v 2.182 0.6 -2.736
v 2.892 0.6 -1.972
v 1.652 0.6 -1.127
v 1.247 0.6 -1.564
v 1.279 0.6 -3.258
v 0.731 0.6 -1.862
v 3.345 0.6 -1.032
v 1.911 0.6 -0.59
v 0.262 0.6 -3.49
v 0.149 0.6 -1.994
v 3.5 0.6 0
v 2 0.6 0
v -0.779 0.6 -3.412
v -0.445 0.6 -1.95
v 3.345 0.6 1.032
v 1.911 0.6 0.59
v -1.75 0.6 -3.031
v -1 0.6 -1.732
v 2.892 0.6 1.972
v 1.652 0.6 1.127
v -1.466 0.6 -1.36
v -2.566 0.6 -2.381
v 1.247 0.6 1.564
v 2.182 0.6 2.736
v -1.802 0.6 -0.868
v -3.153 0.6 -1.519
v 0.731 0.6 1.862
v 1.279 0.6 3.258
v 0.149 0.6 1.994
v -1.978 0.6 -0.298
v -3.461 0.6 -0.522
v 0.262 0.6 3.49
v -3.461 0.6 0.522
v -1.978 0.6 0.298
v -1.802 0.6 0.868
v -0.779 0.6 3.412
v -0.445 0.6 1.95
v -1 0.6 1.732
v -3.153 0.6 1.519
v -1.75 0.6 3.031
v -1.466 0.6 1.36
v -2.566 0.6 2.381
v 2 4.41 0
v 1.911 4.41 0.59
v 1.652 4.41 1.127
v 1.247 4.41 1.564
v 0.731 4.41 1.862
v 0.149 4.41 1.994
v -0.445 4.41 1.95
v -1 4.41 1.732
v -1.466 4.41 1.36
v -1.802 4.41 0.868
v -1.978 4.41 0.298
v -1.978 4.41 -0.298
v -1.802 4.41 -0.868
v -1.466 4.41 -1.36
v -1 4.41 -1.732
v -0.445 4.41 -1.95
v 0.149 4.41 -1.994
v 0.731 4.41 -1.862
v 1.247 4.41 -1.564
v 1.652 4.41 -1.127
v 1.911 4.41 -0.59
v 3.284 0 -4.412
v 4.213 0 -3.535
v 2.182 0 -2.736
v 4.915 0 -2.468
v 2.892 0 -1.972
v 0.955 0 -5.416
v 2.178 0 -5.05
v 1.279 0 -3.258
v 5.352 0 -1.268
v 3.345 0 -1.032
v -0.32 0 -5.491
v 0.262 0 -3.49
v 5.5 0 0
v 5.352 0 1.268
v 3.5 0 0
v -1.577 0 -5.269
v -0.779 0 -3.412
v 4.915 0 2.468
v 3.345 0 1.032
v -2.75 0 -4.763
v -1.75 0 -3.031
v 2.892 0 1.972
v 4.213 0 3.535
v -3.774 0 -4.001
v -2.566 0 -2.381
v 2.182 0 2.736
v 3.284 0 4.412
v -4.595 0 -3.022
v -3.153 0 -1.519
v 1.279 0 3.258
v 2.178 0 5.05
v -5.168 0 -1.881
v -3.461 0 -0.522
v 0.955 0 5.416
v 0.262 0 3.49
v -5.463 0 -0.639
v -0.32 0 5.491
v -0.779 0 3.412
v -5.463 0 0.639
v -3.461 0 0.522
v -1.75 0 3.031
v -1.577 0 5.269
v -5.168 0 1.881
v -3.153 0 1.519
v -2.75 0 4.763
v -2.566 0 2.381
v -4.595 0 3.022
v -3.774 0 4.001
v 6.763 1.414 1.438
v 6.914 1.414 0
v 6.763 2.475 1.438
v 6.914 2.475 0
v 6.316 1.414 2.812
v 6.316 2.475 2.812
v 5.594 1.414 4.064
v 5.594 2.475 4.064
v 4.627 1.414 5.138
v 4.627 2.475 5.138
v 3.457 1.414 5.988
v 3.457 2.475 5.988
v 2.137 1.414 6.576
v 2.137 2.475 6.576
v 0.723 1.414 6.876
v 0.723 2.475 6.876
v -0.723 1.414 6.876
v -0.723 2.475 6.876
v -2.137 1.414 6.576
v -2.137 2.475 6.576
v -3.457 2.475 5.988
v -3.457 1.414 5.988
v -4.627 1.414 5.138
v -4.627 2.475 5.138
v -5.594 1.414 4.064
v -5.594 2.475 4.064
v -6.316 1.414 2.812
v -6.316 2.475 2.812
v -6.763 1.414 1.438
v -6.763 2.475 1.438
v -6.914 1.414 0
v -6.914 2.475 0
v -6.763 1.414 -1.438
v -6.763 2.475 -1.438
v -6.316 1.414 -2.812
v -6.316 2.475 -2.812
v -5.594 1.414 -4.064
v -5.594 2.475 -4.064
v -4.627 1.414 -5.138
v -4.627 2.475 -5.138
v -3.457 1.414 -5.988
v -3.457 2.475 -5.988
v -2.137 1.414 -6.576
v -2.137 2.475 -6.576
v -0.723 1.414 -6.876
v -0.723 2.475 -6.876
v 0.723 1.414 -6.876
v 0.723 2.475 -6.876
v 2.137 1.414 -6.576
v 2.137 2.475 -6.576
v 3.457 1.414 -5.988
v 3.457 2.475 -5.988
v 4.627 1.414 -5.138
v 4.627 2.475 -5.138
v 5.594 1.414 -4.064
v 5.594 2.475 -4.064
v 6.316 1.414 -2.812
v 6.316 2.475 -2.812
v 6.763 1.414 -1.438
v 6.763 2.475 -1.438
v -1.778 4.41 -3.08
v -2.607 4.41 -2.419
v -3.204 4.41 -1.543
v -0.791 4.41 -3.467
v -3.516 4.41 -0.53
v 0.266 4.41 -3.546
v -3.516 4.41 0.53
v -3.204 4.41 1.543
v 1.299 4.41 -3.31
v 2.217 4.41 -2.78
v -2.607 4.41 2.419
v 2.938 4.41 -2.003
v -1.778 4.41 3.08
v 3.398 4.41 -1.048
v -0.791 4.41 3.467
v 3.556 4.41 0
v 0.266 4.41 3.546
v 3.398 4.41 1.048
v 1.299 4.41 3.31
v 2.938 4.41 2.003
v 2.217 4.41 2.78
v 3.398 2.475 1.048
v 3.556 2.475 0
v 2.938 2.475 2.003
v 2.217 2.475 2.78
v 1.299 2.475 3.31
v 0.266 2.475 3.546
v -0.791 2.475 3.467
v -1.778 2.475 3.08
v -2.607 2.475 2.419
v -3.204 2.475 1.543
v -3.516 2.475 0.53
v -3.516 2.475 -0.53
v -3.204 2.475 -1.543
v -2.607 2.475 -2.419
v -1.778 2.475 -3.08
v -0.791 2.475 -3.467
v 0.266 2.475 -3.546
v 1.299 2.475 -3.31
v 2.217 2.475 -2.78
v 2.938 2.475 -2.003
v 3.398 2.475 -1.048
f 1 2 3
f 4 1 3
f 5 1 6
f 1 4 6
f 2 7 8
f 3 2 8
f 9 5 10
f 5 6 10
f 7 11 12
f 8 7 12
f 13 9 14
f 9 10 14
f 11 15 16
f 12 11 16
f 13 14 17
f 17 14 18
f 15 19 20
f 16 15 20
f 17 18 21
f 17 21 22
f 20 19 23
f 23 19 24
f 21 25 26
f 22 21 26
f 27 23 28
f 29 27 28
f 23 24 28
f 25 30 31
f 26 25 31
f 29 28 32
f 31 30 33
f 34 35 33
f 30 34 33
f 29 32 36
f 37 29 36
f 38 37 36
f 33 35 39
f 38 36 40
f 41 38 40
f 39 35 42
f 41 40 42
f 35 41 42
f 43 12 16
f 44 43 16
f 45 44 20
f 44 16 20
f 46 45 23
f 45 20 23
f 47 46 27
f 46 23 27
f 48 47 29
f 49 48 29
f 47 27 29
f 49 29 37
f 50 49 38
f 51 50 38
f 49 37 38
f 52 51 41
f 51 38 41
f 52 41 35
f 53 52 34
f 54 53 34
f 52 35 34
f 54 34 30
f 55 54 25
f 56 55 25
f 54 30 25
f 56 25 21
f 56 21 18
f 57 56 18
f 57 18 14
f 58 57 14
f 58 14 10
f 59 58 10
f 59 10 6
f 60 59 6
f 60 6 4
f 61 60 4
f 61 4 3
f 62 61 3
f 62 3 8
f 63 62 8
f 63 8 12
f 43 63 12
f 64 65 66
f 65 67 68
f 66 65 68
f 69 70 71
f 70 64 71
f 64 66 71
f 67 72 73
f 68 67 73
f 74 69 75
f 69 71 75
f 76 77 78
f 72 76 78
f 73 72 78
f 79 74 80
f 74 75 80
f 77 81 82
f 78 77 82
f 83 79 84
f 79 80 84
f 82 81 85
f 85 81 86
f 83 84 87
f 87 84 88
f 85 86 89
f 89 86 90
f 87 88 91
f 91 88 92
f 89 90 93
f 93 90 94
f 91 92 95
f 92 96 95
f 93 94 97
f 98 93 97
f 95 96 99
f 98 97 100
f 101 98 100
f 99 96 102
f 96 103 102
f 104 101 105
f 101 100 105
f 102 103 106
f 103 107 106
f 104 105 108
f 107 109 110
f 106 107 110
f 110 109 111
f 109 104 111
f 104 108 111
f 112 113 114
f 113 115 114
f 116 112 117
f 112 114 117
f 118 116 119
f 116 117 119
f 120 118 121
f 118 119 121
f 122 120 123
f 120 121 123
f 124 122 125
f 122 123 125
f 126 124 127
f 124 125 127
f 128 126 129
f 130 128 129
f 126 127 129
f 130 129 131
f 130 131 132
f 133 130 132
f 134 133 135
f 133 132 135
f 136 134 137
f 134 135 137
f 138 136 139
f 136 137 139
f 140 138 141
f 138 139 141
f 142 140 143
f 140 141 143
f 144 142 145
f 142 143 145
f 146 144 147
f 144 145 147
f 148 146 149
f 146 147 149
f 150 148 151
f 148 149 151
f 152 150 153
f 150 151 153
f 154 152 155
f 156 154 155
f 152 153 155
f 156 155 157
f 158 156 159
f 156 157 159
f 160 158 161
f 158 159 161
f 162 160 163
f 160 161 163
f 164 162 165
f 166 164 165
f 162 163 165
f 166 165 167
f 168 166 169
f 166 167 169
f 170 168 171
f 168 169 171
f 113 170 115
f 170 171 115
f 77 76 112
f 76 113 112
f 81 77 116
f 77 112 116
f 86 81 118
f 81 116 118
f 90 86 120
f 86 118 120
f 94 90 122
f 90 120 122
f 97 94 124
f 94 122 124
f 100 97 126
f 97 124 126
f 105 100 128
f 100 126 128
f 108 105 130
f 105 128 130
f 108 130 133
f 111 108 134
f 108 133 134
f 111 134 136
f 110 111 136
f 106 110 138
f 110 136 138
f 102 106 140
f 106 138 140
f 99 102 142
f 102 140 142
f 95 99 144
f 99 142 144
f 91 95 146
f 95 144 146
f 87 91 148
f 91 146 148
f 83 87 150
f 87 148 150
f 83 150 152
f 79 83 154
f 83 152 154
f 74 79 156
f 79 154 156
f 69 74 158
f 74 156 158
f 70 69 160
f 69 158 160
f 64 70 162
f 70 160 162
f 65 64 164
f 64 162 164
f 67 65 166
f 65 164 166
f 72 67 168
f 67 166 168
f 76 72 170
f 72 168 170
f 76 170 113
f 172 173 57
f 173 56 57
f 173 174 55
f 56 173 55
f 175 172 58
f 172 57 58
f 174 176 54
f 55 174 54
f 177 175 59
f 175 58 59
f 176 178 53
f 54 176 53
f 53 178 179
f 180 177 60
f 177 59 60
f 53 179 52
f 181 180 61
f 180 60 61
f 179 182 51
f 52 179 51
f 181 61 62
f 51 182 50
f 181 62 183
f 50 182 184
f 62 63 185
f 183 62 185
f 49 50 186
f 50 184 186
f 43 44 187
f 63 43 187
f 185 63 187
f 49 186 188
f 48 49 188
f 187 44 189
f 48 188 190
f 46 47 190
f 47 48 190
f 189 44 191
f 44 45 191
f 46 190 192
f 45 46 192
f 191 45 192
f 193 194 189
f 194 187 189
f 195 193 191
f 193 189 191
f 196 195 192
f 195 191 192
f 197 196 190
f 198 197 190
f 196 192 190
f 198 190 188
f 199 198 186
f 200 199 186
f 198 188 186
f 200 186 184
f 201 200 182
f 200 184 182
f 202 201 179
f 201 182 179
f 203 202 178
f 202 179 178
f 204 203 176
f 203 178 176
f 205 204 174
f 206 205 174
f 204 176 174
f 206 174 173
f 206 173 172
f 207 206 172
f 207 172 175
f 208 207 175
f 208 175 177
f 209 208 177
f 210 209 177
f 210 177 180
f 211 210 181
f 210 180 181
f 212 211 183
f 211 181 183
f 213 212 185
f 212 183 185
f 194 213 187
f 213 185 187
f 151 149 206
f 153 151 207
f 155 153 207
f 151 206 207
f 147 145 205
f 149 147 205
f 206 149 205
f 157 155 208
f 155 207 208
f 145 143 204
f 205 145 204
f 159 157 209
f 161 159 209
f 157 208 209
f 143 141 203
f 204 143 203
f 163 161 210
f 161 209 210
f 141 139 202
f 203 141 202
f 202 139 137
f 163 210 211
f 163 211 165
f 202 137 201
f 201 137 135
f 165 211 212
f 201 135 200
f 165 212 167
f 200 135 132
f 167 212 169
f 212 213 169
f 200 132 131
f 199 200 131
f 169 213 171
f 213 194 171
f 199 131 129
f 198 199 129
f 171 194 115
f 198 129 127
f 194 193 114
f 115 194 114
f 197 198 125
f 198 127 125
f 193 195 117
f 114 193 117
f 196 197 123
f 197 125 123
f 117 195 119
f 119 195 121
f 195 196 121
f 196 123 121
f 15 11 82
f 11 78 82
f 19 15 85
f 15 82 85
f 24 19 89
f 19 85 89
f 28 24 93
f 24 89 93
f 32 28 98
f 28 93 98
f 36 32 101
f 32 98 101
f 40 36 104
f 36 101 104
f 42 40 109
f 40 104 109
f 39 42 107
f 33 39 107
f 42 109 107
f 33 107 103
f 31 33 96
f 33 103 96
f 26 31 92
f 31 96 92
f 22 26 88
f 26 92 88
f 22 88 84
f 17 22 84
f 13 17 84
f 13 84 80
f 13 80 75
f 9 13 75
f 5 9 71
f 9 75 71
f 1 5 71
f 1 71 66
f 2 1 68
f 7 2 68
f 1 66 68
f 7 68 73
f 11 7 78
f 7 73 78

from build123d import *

# Parameters (mm, degrees)
SKETCH2_R          = 2
CUT_EXTRUDE1_DEPTH = 4.81


with BuildPart() as part:
    # Sketch1 → Revolve1 (revolve)
    with BuildSketch(Plane.XY):
        Polygon((0, 0.6), (3.5, 0.6), (3.5, 0), (5.5, 0), (6.914213562, 1.414213562), (6.914213562, 2.475397075), (3.556, 2.475397075), (3.556, 4.41), (0, 4.41), align=None)
    revolve(axis=Axis((0, 4.41, 0), (0, -1, 0)))

    # Sketch2 → Cut-Extrude1 (cut, through all)
    with BuildSketch(Plane.XZ.offset(-0.6)):
        Circle(SKETCH2_R)
    extrude(amount=-CUT_EXTRUDE1_DEPTH, mode=Mode.SUBTRACT)


solid = part.part
